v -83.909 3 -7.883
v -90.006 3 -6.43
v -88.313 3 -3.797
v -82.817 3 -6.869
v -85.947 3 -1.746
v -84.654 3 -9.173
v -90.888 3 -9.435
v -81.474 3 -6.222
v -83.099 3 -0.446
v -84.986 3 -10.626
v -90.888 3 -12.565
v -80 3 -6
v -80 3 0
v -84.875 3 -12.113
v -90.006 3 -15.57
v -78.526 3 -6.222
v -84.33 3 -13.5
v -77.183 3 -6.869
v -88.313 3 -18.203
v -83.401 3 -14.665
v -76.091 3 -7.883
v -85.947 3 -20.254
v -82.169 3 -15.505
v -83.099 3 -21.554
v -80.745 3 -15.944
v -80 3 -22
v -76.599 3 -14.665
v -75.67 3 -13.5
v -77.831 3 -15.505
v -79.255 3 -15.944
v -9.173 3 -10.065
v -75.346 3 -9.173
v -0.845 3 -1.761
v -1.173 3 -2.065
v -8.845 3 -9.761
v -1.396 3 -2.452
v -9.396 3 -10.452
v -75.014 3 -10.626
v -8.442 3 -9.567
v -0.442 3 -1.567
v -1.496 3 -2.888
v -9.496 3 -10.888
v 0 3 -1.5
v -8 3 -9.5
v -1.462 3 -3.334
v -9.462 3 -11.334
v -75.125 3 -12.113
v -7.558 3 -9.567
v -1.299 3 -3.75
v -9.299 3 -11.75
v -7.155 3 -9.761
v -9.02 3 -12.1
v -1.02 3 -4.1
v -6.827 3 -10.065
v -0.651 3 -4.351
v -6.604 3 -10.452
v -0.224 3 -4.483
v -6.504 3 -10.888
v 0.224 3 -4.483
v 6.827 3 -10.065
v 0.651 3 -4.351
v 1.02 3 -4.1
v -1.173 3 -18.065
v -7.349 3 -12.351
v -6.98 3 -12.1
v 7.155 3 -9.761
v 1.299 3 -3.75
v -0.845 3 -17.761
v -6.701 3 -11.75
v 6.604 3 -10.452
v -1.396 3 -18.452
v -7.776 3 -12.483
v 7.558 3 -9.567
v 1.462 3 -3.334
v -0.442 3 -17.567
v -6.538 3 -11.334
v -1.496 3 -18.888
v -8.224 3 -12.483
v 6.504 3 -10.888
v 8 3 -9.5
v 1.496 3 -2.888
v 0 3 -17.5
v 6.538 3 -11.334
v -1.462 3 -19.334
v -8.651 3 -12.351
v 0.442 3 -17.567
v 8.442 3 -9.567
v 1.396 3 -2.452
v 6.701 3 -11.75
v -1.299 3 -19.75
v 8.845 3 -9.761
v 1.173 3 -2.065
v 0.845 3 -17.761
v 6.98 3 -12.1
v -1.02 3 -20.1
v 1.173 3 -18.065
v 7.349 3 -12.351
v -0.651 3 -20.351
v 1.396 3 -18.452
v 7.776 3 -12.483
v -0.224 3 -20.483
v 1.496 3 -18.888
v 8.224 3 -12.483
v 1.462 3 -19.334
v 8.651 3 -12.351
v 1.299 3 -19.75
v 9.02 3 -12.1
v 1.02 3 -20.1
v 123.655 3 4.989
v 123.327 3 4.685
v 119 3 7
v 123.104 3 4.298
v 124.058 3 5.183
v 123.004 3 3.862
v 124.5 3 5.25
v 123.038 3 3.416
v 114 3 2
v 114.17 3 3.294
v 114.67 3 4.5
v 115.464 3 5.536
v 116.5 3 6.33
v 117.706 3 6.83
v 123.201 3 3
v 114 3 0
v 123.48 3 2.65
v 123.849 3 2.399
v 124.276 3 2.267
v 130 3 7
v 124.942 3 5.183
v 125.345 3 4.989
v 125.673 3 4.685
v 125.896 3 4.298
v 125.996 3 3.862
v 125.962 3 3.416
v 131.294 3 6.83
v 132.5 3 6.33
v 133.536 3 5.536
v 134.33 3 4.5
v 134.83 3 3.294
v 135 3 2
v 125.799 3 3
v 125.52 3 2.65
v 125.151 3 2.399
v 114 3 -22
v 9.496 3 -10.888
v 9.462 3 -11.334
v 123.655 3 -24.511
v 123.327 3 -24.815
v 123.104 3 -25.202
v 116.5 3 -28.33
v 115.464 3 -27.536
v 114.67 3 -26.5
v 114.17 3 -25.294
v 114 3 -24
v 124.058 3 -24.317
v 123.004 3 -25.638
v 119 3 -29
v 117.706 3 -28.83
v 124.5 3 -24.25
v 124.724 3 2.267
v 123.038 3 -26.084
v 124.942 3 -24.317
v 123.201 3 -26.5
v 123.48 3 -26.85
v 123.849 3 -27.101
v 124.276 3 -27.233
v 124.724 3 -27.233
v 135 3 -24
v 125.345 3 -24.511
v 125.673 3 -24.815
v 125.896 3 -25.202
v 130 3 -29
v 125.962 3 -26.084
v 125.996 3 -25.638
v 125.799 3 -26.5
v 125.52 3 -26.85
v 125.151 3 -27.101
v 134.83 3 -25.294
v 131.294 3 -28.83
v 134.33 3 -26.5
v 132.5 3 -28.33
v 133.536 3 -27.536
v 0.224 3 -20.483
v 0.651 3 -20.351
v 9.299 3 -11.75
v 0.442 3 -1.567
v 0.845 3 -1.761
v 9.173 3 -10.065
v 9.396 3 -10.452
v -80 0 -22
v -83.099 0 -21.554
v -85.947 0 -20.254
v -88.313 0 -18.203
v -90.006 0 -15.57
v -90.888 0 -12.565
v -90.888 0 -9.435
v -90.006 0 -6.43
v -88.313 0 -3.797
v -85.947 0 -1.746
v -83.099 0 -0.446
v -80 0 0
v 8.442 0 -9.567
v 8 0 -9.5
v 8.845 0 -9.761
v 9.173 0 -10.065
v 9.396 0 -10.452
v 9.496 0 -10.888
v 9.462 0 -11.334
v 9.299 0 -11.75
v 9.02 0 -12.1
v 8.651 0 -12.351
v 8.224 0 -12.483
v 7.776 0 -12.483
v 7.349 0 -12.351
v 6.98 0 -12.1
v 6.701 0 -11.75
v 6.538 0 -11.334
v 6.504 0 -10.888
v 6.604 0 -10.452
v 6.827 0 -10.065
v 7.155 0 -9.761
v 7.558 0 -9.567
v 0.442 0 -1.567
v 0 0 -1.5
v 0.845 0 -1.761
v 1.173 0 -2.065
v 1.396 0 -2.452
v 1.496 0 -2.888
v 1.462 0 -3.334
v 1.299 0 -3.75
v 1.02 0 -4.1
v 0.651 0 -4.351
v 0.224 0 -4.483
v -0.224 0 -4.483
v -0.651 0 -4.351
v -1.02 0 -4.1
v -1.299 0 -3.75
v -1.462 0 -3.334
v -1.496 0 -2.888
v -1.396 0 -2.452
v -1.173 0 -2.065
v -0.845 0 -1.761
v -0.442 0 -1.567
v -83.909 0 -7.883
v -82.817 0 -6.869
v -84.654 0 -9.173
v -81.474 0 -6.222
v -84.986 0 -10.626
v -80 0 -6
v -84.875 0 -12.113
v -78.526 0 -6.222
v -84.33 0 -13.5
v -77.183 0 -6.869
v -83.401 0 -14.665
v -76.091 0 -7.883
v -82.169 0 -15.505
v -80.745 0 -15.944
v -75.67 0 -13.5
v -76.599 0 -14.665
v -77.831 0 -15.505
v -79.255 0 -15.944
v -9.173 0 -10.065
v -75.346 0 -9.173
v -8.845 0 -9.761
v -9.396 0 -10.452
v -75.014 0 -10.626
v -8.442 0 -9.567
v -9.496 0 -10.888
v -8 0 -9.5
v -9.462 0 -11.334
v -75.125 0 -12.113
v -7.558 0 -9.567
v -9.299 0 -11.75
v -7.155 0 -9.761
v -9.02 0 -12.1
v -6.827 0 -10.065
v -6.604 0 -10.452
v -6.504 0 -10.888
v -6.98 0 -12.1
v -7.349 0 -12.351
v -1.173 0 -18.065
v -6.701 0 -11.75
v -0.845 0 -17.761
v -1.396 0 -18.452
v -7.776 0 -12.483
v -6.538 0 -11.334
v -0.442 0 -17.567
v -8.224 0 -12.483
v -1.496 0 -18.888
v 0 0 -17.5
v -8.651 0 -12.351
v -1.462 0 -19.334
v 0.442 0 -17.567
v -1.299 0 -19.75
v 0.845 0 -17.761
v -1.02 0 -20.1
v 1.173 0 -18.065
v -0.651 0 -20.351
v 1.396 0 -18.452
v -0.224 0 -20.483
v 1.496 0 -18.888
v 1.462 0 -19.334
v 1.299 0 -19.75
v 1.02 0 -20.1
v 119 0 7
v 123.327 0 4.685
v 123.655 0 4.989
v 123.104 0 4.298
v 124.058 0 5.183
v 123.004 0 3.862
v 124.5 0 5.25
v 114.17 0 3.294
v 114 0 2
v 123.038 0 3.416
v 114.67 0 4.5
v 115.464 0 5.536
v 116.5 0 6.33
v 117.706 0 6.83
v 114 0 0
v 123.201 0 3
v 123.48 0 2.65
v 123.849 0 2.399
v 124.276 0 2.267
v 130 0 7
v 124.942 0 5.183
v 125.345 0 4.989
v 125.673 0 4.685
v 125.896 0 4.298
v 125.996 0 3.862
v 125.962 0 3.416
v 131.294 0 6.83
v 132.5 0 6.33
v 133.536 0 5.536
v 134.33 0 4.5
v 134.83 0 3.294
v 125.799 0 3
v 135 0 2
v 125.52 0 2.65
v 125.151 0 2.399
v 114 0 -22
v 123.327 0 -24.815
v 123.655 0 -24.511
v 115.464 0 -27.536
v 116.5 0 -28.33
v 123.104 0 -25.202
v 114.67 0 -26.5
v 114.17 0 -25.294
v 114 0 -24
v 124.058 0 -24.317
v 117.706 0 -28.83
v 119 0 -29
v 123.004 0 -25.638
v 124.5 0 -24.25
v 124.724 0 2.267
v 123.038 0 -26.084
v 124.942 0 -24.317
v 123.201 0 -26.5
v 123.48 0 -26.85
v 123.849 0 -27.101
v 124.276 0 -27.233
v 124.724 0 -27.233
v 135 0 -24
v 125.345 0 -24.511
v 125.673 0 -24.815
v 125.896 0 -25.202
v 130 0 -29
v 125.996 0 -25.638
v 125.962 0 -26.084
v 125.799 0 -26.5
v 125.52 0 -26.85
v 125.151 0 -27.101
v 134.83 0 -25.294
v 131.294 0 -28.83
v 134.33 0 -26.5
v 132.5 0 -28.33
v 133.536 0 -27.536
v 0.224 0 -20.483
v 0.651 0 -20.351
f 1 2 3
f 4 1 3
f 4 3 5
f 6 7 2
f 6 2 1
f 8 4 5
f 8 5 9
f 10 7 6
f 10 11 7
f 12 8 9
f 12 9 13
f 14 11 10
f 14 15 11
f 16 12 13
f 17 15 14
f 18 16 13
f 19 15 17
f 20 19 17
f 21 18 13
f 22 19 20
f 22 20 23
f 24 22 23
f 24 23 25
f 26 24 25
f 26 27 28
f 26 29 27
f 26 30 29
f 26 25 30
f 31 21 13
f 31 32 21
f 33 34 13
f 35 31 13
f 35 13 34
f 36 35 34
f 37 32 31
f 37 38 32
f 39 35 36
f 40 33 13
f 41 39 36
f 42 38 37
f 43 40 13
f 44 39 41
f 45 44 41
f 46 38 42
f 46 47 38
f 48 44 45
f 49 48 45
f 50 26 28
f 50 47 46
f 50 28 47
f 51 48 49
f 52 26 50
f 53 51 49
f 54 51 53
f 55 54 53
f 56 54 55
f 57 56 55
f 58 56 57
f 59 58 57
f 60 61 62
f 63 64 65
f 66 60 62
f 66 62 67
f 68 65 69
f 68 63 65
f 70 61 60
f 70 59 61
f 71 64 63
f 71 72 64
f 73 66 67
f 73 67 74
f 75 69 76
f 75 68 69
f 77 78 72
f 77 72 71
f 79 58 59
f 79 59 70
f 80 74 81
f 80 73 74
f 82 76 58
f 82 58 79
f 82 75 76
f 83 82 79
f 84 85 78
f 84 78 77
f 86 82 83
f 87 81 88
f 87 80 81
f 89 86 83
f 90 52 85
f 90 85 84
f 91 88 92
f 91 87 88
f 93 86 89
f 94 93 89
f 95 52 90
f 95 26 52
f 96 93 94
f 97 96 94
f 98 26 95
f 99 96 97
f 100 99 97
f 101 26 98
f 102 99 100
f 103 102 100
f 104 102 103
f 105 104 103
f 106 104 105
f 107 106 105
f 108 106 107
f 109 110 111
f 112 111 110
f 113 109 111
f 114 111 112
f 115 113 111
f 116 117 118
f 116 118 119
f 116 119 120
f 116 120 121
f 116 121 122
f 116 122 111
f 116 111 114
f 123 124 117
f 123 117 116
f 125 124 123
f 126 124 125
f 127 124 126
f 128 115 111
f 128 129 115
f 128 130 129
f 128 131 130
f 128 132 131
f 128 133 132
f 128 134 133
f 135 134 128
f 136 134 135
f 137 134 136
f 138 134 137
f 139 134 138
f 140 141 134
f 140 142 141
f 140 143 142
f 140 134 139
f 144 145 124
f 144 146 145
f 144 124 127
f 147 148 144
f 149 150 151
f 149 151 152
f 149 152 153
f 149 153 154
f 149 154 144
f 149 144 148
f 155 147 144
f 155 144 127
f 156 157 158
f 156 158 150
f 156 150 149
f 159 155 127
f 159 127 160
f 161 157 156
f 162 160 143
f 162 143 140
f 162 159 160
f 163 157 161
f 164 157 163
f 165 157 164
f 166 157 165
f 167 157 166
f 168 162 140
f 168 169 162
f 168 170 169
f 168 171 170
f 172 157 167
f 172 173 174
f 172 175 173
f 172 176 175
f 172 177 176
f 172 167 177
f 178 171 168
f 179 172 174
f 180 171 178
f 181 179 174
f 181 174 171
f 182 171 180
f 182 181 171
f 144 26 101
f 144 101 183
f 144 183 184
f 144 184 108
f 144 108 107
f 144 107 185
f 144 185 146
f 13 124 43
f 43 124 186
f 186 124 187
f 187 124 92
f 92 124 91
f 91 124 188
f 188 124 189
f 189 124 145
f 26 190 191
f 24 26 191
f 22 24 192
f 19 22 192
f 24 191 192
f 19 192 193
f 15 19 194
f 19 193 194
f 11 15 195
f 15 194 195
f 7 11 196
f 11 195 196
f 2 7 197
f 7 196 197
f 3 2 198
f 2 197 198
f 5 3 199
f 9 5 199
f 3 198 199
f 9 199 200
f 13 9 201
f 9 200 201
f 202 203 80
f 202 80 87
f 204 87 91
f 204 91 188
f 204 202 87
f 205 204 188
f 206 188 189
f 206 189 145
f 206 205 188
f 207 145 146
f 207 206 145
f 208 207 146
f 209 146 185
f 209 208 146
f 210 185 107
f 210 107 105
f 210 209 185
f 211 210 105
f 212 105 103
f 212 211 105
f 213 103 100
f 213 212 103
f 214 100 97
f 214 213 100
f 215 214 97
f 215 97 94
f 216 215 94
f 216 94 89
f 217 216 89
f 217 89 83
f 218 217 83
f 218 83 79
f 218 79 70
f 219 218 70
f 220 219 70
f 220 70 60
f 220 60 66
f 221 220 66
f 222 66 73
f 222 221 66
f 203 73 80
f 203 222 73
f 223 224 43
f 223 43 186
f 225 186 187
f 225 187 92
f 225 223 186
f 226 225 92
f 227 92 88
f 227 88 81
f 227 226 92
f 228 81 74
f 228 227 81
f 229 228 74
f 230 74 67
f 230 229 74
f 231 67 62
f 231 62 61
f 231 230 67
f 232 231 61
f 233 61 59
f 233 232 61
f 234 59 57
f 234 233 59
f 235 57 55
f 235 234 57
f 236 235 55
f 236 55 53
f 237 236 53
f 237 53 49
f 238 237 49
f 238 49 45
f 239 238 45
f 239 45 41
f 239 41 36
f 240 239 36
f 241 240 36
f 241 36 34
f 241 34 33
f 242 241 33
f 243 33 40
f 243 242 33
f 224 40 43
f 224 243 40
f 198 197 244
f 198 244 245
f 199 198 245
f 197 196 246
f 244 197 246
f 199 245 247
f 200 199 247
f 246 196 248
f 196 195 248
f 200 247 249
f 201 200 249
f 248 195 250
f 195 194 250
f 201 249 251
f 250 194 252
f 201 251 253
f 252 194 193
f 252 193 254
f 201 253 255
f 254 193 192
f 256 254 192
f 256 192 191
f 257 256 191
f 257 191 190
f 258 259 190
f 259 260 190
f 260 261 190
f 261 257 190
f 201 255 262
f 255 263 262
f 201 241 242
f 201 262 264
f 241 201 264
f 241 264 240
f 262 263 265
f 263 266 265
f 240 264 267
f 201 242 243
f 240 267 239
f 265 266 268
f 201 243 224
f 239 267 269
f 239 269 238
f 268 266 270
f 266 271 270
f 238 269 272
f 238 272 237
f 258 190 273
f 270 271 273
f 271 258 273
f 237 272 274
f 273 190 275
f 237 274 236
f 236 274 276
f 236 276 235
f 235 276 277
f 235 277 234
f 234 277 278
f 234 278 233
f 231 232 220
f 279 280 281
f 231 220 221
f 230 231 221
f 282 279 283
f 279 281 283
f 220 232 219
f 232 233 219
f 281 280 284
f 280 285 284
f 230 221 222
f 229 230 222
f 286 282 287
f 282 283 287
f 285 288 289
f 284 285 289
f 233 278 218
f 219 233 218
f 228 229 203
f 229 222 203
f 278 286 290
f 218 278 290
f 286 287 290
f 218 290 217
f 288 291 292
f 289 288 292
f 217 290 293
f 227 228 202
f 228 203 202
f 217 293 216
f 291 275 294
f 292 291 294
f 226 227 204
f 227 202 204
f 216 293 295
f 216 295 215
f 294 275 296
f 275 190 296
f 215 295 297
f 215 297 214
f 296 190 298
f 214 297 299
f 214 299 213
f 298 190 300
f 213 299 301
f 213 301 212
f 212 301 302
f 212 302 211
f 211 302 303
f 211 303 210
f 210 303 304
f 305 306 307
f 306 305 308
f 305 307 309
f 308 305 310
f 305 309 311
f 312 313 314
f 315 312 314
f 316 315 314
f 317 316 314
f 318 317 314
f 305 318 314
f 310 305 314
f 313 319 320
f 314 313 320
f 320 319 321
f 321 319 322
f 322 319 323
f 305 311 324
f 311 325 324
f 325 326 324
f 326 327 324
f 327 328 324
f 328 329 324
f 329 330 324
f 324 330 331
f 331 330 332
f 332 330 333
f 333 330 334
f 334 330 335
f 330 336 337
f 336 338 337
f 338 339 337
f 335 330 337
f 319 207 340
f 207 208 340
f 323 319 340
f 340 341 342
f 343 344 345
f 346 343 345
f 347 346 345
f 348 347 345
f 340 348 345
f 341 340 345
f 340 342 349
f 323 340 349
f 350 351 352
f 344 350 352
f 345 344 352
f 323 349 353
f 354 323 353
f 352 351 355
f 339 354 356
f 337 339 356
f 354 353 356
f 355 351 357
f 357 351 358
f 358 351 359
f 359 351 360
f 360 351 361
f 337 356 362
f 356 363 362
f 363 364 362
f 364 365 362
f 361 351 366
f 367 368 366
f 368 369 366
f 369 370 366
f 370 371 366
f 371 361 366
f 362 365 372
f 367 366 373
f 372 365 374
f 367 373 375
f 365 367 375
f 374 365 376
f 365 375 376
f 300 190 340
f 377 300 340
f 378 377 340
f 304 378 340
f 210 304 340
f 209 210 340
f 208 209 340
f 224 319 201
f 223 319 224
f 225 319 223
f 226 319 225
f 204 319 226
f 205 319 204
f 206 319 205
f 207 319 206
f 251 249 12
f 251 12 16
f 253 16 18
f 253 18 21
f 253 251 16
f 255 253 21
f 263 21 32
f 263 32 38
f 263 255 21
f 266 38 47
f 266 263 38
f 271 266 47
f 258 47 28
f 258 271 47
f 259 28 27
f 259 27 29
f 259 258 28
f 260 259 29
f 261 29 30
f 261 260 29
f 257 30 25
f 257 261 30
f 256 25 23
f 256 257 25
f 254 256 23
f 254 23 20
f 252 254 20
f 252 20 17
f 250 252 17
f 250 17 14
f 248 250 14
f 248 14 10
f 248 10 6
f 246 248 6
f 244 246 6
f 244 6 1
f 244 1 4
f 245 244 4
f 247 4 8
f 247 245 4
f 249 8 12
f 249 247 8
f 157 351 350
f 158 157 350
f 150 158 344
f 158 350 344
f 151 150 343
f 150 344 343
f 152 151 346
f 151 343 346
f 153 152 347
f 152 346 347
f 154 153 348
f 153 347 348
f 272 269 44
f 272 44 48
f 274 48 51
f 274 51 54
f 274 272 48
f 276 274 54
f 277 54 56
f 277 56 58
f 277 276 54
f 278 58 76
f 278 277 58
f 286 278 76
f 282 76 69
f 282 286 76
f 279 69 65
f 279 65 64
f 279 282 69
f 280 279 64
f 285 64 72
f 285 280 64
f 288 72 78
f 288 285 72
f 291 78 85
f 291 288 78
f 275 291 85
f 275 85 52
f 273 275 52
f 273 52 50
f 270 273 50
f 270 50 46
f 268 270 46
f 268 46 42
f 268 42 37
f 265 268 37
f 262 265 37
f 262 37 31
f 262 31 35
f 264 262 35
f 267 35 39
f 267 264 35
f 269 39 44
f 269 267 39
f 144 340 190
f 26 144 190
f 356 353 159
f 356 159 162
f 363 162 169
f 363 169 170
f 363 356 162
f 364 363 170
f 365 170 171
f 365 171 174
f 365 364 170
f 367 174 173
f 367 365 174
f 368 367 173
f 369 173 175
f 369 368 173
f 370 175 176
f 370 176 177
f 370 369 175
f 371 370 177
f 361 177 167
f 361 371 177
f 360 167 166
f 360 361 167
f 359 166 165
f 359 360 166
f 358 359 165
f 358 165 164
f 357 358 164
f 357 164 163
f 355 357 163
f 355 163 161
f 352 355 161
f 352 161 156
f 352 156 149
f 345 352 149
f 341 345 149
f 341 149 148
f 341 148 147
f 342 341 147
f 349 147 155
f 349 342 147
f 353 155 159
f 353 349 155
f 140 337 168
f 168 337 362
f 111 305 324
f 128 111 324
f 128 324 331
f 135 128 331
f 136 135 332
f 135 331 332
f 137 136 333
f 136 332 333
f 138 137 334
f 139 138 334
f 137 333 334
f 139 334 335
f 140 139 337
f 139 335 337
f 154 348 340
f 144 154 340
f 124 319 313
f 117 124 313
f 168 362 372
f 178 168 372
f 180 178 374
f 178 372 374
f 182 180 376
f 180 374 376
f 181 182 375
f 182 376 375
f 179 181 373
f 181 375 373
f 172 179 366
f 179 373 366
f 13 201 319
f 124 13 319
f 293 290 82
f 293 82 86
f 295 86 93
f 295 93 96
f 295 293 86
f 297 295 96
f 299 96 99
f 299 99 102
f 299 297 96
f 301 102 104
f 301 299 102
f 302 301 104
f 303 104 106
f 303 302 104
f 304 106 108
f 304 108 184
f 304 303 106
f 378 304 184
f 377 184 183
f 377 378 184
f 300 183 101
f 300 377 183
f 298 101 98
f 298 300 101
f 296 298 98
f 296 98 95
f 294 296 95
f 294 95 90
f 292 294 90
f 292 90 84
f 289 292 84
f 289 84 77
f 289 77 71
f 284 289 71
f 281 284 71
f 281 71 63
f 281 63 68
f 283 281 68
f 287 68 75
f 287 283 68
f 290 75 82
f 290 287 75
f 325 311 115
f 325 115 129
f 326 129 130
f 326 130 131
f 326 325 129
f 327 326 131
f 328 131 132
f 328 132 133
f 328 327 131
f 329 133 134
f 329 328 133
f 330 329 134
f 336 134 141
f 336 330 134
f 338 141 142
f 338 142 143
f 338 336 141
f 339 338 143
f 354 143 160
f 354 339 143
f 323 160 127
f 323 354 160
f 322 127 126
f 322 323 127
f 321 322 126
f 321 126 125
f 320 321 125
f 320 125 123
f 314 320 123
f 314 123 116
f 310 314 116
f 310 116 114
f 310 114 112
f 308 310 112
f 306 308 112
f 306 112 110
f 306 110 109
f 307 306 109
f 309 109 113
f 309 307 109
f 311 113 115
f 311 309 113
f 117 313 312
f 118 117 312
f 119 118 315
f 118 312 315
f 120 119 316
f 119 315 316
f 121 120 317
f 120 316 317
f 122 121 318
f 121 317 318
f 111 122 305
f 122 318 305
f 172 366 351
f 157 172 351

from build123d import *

# Parameters (mm, degrees)
SKETCH_1_R      = 5
SKETCH_1_R_2    = 1.5
EXTRUDE_1_DEPTH = 3


with BuildPart() as part:
    # 草图1 → 凸台-拉伸1 (new body)
    with BuildSketch(Plane(origin=(0, 0, 0), x_dir=(1, 0, 0), z_dir=(0, 1, 0))):
        with BuildLine():
            Line((135, -2), (135, 24))
            ThreePointArc((135, 24), (133.535533906, 27.535533906), (130, 29))
            Line((130, 29), (119, 29))
            ThreePointArc((119, 29), (115.464466094, 27.535533906), (114, 24))
            Line((114, 24), (114, 22))
            Line((114, 22), (0, 22))
            Line((0, 22), (-80, 22))
            ThreePointArc((-80, 22), (-91, 11), (-80, 0))
            Line((-80, 0), (0, 0))
            Line((0, 0), (114, 0))
            Line((114, 0), (114, -2))
            ThreePointArc((114, -2), (115.464466094, -5.535533906), (119, -7))
            Line((119, -7), (130, -7))
            ThreePointArc((130, -7), (133.535533906, -5.535533906), (135, -2))
        make_face()
        with Locations(Location((-80, 11, 0), (0, 0, 270))):
            Circle(SKETCH_1_R, mode=Mode.SUBTRACT)
        with Locations(Location((124.5, 25.75, 0), (0, 0, 270))):
            Circle(SKETCH_1_R_2, mode=Mode.SUBTRACT)
        with Locations(Location((124.5, -3.75, 0), (0, 0, 270))):
            Circle(SKETCH_1_R_2, mode=Mode.SUBTRACT)
        with Locations(Location((0, 19, 0), (0, 0, 270))):
            Circle(SKETCH_1_R_2, mode=Mode.SUBTRACT)
        with Locations(Location((8, 11, 0), (0, 0, 270))):
            Circle(SKETCH_1_R_2, mode=Mode.SUBTRACT)
        with Locations(Location((0, 3, 0), (0, 0, 270))):
            Circle(SKETCH_1_R_2, mode=Mode.SUBTRACT)
        with Locations(Location((-8, 11, 0), (0, 0, 270))):
            Circle(SKETCH_1_R_2, mode=Mode.SUBTRACT)
    extrude(amount=EXTRUDE_1_DEPTH)


solid = part.part
